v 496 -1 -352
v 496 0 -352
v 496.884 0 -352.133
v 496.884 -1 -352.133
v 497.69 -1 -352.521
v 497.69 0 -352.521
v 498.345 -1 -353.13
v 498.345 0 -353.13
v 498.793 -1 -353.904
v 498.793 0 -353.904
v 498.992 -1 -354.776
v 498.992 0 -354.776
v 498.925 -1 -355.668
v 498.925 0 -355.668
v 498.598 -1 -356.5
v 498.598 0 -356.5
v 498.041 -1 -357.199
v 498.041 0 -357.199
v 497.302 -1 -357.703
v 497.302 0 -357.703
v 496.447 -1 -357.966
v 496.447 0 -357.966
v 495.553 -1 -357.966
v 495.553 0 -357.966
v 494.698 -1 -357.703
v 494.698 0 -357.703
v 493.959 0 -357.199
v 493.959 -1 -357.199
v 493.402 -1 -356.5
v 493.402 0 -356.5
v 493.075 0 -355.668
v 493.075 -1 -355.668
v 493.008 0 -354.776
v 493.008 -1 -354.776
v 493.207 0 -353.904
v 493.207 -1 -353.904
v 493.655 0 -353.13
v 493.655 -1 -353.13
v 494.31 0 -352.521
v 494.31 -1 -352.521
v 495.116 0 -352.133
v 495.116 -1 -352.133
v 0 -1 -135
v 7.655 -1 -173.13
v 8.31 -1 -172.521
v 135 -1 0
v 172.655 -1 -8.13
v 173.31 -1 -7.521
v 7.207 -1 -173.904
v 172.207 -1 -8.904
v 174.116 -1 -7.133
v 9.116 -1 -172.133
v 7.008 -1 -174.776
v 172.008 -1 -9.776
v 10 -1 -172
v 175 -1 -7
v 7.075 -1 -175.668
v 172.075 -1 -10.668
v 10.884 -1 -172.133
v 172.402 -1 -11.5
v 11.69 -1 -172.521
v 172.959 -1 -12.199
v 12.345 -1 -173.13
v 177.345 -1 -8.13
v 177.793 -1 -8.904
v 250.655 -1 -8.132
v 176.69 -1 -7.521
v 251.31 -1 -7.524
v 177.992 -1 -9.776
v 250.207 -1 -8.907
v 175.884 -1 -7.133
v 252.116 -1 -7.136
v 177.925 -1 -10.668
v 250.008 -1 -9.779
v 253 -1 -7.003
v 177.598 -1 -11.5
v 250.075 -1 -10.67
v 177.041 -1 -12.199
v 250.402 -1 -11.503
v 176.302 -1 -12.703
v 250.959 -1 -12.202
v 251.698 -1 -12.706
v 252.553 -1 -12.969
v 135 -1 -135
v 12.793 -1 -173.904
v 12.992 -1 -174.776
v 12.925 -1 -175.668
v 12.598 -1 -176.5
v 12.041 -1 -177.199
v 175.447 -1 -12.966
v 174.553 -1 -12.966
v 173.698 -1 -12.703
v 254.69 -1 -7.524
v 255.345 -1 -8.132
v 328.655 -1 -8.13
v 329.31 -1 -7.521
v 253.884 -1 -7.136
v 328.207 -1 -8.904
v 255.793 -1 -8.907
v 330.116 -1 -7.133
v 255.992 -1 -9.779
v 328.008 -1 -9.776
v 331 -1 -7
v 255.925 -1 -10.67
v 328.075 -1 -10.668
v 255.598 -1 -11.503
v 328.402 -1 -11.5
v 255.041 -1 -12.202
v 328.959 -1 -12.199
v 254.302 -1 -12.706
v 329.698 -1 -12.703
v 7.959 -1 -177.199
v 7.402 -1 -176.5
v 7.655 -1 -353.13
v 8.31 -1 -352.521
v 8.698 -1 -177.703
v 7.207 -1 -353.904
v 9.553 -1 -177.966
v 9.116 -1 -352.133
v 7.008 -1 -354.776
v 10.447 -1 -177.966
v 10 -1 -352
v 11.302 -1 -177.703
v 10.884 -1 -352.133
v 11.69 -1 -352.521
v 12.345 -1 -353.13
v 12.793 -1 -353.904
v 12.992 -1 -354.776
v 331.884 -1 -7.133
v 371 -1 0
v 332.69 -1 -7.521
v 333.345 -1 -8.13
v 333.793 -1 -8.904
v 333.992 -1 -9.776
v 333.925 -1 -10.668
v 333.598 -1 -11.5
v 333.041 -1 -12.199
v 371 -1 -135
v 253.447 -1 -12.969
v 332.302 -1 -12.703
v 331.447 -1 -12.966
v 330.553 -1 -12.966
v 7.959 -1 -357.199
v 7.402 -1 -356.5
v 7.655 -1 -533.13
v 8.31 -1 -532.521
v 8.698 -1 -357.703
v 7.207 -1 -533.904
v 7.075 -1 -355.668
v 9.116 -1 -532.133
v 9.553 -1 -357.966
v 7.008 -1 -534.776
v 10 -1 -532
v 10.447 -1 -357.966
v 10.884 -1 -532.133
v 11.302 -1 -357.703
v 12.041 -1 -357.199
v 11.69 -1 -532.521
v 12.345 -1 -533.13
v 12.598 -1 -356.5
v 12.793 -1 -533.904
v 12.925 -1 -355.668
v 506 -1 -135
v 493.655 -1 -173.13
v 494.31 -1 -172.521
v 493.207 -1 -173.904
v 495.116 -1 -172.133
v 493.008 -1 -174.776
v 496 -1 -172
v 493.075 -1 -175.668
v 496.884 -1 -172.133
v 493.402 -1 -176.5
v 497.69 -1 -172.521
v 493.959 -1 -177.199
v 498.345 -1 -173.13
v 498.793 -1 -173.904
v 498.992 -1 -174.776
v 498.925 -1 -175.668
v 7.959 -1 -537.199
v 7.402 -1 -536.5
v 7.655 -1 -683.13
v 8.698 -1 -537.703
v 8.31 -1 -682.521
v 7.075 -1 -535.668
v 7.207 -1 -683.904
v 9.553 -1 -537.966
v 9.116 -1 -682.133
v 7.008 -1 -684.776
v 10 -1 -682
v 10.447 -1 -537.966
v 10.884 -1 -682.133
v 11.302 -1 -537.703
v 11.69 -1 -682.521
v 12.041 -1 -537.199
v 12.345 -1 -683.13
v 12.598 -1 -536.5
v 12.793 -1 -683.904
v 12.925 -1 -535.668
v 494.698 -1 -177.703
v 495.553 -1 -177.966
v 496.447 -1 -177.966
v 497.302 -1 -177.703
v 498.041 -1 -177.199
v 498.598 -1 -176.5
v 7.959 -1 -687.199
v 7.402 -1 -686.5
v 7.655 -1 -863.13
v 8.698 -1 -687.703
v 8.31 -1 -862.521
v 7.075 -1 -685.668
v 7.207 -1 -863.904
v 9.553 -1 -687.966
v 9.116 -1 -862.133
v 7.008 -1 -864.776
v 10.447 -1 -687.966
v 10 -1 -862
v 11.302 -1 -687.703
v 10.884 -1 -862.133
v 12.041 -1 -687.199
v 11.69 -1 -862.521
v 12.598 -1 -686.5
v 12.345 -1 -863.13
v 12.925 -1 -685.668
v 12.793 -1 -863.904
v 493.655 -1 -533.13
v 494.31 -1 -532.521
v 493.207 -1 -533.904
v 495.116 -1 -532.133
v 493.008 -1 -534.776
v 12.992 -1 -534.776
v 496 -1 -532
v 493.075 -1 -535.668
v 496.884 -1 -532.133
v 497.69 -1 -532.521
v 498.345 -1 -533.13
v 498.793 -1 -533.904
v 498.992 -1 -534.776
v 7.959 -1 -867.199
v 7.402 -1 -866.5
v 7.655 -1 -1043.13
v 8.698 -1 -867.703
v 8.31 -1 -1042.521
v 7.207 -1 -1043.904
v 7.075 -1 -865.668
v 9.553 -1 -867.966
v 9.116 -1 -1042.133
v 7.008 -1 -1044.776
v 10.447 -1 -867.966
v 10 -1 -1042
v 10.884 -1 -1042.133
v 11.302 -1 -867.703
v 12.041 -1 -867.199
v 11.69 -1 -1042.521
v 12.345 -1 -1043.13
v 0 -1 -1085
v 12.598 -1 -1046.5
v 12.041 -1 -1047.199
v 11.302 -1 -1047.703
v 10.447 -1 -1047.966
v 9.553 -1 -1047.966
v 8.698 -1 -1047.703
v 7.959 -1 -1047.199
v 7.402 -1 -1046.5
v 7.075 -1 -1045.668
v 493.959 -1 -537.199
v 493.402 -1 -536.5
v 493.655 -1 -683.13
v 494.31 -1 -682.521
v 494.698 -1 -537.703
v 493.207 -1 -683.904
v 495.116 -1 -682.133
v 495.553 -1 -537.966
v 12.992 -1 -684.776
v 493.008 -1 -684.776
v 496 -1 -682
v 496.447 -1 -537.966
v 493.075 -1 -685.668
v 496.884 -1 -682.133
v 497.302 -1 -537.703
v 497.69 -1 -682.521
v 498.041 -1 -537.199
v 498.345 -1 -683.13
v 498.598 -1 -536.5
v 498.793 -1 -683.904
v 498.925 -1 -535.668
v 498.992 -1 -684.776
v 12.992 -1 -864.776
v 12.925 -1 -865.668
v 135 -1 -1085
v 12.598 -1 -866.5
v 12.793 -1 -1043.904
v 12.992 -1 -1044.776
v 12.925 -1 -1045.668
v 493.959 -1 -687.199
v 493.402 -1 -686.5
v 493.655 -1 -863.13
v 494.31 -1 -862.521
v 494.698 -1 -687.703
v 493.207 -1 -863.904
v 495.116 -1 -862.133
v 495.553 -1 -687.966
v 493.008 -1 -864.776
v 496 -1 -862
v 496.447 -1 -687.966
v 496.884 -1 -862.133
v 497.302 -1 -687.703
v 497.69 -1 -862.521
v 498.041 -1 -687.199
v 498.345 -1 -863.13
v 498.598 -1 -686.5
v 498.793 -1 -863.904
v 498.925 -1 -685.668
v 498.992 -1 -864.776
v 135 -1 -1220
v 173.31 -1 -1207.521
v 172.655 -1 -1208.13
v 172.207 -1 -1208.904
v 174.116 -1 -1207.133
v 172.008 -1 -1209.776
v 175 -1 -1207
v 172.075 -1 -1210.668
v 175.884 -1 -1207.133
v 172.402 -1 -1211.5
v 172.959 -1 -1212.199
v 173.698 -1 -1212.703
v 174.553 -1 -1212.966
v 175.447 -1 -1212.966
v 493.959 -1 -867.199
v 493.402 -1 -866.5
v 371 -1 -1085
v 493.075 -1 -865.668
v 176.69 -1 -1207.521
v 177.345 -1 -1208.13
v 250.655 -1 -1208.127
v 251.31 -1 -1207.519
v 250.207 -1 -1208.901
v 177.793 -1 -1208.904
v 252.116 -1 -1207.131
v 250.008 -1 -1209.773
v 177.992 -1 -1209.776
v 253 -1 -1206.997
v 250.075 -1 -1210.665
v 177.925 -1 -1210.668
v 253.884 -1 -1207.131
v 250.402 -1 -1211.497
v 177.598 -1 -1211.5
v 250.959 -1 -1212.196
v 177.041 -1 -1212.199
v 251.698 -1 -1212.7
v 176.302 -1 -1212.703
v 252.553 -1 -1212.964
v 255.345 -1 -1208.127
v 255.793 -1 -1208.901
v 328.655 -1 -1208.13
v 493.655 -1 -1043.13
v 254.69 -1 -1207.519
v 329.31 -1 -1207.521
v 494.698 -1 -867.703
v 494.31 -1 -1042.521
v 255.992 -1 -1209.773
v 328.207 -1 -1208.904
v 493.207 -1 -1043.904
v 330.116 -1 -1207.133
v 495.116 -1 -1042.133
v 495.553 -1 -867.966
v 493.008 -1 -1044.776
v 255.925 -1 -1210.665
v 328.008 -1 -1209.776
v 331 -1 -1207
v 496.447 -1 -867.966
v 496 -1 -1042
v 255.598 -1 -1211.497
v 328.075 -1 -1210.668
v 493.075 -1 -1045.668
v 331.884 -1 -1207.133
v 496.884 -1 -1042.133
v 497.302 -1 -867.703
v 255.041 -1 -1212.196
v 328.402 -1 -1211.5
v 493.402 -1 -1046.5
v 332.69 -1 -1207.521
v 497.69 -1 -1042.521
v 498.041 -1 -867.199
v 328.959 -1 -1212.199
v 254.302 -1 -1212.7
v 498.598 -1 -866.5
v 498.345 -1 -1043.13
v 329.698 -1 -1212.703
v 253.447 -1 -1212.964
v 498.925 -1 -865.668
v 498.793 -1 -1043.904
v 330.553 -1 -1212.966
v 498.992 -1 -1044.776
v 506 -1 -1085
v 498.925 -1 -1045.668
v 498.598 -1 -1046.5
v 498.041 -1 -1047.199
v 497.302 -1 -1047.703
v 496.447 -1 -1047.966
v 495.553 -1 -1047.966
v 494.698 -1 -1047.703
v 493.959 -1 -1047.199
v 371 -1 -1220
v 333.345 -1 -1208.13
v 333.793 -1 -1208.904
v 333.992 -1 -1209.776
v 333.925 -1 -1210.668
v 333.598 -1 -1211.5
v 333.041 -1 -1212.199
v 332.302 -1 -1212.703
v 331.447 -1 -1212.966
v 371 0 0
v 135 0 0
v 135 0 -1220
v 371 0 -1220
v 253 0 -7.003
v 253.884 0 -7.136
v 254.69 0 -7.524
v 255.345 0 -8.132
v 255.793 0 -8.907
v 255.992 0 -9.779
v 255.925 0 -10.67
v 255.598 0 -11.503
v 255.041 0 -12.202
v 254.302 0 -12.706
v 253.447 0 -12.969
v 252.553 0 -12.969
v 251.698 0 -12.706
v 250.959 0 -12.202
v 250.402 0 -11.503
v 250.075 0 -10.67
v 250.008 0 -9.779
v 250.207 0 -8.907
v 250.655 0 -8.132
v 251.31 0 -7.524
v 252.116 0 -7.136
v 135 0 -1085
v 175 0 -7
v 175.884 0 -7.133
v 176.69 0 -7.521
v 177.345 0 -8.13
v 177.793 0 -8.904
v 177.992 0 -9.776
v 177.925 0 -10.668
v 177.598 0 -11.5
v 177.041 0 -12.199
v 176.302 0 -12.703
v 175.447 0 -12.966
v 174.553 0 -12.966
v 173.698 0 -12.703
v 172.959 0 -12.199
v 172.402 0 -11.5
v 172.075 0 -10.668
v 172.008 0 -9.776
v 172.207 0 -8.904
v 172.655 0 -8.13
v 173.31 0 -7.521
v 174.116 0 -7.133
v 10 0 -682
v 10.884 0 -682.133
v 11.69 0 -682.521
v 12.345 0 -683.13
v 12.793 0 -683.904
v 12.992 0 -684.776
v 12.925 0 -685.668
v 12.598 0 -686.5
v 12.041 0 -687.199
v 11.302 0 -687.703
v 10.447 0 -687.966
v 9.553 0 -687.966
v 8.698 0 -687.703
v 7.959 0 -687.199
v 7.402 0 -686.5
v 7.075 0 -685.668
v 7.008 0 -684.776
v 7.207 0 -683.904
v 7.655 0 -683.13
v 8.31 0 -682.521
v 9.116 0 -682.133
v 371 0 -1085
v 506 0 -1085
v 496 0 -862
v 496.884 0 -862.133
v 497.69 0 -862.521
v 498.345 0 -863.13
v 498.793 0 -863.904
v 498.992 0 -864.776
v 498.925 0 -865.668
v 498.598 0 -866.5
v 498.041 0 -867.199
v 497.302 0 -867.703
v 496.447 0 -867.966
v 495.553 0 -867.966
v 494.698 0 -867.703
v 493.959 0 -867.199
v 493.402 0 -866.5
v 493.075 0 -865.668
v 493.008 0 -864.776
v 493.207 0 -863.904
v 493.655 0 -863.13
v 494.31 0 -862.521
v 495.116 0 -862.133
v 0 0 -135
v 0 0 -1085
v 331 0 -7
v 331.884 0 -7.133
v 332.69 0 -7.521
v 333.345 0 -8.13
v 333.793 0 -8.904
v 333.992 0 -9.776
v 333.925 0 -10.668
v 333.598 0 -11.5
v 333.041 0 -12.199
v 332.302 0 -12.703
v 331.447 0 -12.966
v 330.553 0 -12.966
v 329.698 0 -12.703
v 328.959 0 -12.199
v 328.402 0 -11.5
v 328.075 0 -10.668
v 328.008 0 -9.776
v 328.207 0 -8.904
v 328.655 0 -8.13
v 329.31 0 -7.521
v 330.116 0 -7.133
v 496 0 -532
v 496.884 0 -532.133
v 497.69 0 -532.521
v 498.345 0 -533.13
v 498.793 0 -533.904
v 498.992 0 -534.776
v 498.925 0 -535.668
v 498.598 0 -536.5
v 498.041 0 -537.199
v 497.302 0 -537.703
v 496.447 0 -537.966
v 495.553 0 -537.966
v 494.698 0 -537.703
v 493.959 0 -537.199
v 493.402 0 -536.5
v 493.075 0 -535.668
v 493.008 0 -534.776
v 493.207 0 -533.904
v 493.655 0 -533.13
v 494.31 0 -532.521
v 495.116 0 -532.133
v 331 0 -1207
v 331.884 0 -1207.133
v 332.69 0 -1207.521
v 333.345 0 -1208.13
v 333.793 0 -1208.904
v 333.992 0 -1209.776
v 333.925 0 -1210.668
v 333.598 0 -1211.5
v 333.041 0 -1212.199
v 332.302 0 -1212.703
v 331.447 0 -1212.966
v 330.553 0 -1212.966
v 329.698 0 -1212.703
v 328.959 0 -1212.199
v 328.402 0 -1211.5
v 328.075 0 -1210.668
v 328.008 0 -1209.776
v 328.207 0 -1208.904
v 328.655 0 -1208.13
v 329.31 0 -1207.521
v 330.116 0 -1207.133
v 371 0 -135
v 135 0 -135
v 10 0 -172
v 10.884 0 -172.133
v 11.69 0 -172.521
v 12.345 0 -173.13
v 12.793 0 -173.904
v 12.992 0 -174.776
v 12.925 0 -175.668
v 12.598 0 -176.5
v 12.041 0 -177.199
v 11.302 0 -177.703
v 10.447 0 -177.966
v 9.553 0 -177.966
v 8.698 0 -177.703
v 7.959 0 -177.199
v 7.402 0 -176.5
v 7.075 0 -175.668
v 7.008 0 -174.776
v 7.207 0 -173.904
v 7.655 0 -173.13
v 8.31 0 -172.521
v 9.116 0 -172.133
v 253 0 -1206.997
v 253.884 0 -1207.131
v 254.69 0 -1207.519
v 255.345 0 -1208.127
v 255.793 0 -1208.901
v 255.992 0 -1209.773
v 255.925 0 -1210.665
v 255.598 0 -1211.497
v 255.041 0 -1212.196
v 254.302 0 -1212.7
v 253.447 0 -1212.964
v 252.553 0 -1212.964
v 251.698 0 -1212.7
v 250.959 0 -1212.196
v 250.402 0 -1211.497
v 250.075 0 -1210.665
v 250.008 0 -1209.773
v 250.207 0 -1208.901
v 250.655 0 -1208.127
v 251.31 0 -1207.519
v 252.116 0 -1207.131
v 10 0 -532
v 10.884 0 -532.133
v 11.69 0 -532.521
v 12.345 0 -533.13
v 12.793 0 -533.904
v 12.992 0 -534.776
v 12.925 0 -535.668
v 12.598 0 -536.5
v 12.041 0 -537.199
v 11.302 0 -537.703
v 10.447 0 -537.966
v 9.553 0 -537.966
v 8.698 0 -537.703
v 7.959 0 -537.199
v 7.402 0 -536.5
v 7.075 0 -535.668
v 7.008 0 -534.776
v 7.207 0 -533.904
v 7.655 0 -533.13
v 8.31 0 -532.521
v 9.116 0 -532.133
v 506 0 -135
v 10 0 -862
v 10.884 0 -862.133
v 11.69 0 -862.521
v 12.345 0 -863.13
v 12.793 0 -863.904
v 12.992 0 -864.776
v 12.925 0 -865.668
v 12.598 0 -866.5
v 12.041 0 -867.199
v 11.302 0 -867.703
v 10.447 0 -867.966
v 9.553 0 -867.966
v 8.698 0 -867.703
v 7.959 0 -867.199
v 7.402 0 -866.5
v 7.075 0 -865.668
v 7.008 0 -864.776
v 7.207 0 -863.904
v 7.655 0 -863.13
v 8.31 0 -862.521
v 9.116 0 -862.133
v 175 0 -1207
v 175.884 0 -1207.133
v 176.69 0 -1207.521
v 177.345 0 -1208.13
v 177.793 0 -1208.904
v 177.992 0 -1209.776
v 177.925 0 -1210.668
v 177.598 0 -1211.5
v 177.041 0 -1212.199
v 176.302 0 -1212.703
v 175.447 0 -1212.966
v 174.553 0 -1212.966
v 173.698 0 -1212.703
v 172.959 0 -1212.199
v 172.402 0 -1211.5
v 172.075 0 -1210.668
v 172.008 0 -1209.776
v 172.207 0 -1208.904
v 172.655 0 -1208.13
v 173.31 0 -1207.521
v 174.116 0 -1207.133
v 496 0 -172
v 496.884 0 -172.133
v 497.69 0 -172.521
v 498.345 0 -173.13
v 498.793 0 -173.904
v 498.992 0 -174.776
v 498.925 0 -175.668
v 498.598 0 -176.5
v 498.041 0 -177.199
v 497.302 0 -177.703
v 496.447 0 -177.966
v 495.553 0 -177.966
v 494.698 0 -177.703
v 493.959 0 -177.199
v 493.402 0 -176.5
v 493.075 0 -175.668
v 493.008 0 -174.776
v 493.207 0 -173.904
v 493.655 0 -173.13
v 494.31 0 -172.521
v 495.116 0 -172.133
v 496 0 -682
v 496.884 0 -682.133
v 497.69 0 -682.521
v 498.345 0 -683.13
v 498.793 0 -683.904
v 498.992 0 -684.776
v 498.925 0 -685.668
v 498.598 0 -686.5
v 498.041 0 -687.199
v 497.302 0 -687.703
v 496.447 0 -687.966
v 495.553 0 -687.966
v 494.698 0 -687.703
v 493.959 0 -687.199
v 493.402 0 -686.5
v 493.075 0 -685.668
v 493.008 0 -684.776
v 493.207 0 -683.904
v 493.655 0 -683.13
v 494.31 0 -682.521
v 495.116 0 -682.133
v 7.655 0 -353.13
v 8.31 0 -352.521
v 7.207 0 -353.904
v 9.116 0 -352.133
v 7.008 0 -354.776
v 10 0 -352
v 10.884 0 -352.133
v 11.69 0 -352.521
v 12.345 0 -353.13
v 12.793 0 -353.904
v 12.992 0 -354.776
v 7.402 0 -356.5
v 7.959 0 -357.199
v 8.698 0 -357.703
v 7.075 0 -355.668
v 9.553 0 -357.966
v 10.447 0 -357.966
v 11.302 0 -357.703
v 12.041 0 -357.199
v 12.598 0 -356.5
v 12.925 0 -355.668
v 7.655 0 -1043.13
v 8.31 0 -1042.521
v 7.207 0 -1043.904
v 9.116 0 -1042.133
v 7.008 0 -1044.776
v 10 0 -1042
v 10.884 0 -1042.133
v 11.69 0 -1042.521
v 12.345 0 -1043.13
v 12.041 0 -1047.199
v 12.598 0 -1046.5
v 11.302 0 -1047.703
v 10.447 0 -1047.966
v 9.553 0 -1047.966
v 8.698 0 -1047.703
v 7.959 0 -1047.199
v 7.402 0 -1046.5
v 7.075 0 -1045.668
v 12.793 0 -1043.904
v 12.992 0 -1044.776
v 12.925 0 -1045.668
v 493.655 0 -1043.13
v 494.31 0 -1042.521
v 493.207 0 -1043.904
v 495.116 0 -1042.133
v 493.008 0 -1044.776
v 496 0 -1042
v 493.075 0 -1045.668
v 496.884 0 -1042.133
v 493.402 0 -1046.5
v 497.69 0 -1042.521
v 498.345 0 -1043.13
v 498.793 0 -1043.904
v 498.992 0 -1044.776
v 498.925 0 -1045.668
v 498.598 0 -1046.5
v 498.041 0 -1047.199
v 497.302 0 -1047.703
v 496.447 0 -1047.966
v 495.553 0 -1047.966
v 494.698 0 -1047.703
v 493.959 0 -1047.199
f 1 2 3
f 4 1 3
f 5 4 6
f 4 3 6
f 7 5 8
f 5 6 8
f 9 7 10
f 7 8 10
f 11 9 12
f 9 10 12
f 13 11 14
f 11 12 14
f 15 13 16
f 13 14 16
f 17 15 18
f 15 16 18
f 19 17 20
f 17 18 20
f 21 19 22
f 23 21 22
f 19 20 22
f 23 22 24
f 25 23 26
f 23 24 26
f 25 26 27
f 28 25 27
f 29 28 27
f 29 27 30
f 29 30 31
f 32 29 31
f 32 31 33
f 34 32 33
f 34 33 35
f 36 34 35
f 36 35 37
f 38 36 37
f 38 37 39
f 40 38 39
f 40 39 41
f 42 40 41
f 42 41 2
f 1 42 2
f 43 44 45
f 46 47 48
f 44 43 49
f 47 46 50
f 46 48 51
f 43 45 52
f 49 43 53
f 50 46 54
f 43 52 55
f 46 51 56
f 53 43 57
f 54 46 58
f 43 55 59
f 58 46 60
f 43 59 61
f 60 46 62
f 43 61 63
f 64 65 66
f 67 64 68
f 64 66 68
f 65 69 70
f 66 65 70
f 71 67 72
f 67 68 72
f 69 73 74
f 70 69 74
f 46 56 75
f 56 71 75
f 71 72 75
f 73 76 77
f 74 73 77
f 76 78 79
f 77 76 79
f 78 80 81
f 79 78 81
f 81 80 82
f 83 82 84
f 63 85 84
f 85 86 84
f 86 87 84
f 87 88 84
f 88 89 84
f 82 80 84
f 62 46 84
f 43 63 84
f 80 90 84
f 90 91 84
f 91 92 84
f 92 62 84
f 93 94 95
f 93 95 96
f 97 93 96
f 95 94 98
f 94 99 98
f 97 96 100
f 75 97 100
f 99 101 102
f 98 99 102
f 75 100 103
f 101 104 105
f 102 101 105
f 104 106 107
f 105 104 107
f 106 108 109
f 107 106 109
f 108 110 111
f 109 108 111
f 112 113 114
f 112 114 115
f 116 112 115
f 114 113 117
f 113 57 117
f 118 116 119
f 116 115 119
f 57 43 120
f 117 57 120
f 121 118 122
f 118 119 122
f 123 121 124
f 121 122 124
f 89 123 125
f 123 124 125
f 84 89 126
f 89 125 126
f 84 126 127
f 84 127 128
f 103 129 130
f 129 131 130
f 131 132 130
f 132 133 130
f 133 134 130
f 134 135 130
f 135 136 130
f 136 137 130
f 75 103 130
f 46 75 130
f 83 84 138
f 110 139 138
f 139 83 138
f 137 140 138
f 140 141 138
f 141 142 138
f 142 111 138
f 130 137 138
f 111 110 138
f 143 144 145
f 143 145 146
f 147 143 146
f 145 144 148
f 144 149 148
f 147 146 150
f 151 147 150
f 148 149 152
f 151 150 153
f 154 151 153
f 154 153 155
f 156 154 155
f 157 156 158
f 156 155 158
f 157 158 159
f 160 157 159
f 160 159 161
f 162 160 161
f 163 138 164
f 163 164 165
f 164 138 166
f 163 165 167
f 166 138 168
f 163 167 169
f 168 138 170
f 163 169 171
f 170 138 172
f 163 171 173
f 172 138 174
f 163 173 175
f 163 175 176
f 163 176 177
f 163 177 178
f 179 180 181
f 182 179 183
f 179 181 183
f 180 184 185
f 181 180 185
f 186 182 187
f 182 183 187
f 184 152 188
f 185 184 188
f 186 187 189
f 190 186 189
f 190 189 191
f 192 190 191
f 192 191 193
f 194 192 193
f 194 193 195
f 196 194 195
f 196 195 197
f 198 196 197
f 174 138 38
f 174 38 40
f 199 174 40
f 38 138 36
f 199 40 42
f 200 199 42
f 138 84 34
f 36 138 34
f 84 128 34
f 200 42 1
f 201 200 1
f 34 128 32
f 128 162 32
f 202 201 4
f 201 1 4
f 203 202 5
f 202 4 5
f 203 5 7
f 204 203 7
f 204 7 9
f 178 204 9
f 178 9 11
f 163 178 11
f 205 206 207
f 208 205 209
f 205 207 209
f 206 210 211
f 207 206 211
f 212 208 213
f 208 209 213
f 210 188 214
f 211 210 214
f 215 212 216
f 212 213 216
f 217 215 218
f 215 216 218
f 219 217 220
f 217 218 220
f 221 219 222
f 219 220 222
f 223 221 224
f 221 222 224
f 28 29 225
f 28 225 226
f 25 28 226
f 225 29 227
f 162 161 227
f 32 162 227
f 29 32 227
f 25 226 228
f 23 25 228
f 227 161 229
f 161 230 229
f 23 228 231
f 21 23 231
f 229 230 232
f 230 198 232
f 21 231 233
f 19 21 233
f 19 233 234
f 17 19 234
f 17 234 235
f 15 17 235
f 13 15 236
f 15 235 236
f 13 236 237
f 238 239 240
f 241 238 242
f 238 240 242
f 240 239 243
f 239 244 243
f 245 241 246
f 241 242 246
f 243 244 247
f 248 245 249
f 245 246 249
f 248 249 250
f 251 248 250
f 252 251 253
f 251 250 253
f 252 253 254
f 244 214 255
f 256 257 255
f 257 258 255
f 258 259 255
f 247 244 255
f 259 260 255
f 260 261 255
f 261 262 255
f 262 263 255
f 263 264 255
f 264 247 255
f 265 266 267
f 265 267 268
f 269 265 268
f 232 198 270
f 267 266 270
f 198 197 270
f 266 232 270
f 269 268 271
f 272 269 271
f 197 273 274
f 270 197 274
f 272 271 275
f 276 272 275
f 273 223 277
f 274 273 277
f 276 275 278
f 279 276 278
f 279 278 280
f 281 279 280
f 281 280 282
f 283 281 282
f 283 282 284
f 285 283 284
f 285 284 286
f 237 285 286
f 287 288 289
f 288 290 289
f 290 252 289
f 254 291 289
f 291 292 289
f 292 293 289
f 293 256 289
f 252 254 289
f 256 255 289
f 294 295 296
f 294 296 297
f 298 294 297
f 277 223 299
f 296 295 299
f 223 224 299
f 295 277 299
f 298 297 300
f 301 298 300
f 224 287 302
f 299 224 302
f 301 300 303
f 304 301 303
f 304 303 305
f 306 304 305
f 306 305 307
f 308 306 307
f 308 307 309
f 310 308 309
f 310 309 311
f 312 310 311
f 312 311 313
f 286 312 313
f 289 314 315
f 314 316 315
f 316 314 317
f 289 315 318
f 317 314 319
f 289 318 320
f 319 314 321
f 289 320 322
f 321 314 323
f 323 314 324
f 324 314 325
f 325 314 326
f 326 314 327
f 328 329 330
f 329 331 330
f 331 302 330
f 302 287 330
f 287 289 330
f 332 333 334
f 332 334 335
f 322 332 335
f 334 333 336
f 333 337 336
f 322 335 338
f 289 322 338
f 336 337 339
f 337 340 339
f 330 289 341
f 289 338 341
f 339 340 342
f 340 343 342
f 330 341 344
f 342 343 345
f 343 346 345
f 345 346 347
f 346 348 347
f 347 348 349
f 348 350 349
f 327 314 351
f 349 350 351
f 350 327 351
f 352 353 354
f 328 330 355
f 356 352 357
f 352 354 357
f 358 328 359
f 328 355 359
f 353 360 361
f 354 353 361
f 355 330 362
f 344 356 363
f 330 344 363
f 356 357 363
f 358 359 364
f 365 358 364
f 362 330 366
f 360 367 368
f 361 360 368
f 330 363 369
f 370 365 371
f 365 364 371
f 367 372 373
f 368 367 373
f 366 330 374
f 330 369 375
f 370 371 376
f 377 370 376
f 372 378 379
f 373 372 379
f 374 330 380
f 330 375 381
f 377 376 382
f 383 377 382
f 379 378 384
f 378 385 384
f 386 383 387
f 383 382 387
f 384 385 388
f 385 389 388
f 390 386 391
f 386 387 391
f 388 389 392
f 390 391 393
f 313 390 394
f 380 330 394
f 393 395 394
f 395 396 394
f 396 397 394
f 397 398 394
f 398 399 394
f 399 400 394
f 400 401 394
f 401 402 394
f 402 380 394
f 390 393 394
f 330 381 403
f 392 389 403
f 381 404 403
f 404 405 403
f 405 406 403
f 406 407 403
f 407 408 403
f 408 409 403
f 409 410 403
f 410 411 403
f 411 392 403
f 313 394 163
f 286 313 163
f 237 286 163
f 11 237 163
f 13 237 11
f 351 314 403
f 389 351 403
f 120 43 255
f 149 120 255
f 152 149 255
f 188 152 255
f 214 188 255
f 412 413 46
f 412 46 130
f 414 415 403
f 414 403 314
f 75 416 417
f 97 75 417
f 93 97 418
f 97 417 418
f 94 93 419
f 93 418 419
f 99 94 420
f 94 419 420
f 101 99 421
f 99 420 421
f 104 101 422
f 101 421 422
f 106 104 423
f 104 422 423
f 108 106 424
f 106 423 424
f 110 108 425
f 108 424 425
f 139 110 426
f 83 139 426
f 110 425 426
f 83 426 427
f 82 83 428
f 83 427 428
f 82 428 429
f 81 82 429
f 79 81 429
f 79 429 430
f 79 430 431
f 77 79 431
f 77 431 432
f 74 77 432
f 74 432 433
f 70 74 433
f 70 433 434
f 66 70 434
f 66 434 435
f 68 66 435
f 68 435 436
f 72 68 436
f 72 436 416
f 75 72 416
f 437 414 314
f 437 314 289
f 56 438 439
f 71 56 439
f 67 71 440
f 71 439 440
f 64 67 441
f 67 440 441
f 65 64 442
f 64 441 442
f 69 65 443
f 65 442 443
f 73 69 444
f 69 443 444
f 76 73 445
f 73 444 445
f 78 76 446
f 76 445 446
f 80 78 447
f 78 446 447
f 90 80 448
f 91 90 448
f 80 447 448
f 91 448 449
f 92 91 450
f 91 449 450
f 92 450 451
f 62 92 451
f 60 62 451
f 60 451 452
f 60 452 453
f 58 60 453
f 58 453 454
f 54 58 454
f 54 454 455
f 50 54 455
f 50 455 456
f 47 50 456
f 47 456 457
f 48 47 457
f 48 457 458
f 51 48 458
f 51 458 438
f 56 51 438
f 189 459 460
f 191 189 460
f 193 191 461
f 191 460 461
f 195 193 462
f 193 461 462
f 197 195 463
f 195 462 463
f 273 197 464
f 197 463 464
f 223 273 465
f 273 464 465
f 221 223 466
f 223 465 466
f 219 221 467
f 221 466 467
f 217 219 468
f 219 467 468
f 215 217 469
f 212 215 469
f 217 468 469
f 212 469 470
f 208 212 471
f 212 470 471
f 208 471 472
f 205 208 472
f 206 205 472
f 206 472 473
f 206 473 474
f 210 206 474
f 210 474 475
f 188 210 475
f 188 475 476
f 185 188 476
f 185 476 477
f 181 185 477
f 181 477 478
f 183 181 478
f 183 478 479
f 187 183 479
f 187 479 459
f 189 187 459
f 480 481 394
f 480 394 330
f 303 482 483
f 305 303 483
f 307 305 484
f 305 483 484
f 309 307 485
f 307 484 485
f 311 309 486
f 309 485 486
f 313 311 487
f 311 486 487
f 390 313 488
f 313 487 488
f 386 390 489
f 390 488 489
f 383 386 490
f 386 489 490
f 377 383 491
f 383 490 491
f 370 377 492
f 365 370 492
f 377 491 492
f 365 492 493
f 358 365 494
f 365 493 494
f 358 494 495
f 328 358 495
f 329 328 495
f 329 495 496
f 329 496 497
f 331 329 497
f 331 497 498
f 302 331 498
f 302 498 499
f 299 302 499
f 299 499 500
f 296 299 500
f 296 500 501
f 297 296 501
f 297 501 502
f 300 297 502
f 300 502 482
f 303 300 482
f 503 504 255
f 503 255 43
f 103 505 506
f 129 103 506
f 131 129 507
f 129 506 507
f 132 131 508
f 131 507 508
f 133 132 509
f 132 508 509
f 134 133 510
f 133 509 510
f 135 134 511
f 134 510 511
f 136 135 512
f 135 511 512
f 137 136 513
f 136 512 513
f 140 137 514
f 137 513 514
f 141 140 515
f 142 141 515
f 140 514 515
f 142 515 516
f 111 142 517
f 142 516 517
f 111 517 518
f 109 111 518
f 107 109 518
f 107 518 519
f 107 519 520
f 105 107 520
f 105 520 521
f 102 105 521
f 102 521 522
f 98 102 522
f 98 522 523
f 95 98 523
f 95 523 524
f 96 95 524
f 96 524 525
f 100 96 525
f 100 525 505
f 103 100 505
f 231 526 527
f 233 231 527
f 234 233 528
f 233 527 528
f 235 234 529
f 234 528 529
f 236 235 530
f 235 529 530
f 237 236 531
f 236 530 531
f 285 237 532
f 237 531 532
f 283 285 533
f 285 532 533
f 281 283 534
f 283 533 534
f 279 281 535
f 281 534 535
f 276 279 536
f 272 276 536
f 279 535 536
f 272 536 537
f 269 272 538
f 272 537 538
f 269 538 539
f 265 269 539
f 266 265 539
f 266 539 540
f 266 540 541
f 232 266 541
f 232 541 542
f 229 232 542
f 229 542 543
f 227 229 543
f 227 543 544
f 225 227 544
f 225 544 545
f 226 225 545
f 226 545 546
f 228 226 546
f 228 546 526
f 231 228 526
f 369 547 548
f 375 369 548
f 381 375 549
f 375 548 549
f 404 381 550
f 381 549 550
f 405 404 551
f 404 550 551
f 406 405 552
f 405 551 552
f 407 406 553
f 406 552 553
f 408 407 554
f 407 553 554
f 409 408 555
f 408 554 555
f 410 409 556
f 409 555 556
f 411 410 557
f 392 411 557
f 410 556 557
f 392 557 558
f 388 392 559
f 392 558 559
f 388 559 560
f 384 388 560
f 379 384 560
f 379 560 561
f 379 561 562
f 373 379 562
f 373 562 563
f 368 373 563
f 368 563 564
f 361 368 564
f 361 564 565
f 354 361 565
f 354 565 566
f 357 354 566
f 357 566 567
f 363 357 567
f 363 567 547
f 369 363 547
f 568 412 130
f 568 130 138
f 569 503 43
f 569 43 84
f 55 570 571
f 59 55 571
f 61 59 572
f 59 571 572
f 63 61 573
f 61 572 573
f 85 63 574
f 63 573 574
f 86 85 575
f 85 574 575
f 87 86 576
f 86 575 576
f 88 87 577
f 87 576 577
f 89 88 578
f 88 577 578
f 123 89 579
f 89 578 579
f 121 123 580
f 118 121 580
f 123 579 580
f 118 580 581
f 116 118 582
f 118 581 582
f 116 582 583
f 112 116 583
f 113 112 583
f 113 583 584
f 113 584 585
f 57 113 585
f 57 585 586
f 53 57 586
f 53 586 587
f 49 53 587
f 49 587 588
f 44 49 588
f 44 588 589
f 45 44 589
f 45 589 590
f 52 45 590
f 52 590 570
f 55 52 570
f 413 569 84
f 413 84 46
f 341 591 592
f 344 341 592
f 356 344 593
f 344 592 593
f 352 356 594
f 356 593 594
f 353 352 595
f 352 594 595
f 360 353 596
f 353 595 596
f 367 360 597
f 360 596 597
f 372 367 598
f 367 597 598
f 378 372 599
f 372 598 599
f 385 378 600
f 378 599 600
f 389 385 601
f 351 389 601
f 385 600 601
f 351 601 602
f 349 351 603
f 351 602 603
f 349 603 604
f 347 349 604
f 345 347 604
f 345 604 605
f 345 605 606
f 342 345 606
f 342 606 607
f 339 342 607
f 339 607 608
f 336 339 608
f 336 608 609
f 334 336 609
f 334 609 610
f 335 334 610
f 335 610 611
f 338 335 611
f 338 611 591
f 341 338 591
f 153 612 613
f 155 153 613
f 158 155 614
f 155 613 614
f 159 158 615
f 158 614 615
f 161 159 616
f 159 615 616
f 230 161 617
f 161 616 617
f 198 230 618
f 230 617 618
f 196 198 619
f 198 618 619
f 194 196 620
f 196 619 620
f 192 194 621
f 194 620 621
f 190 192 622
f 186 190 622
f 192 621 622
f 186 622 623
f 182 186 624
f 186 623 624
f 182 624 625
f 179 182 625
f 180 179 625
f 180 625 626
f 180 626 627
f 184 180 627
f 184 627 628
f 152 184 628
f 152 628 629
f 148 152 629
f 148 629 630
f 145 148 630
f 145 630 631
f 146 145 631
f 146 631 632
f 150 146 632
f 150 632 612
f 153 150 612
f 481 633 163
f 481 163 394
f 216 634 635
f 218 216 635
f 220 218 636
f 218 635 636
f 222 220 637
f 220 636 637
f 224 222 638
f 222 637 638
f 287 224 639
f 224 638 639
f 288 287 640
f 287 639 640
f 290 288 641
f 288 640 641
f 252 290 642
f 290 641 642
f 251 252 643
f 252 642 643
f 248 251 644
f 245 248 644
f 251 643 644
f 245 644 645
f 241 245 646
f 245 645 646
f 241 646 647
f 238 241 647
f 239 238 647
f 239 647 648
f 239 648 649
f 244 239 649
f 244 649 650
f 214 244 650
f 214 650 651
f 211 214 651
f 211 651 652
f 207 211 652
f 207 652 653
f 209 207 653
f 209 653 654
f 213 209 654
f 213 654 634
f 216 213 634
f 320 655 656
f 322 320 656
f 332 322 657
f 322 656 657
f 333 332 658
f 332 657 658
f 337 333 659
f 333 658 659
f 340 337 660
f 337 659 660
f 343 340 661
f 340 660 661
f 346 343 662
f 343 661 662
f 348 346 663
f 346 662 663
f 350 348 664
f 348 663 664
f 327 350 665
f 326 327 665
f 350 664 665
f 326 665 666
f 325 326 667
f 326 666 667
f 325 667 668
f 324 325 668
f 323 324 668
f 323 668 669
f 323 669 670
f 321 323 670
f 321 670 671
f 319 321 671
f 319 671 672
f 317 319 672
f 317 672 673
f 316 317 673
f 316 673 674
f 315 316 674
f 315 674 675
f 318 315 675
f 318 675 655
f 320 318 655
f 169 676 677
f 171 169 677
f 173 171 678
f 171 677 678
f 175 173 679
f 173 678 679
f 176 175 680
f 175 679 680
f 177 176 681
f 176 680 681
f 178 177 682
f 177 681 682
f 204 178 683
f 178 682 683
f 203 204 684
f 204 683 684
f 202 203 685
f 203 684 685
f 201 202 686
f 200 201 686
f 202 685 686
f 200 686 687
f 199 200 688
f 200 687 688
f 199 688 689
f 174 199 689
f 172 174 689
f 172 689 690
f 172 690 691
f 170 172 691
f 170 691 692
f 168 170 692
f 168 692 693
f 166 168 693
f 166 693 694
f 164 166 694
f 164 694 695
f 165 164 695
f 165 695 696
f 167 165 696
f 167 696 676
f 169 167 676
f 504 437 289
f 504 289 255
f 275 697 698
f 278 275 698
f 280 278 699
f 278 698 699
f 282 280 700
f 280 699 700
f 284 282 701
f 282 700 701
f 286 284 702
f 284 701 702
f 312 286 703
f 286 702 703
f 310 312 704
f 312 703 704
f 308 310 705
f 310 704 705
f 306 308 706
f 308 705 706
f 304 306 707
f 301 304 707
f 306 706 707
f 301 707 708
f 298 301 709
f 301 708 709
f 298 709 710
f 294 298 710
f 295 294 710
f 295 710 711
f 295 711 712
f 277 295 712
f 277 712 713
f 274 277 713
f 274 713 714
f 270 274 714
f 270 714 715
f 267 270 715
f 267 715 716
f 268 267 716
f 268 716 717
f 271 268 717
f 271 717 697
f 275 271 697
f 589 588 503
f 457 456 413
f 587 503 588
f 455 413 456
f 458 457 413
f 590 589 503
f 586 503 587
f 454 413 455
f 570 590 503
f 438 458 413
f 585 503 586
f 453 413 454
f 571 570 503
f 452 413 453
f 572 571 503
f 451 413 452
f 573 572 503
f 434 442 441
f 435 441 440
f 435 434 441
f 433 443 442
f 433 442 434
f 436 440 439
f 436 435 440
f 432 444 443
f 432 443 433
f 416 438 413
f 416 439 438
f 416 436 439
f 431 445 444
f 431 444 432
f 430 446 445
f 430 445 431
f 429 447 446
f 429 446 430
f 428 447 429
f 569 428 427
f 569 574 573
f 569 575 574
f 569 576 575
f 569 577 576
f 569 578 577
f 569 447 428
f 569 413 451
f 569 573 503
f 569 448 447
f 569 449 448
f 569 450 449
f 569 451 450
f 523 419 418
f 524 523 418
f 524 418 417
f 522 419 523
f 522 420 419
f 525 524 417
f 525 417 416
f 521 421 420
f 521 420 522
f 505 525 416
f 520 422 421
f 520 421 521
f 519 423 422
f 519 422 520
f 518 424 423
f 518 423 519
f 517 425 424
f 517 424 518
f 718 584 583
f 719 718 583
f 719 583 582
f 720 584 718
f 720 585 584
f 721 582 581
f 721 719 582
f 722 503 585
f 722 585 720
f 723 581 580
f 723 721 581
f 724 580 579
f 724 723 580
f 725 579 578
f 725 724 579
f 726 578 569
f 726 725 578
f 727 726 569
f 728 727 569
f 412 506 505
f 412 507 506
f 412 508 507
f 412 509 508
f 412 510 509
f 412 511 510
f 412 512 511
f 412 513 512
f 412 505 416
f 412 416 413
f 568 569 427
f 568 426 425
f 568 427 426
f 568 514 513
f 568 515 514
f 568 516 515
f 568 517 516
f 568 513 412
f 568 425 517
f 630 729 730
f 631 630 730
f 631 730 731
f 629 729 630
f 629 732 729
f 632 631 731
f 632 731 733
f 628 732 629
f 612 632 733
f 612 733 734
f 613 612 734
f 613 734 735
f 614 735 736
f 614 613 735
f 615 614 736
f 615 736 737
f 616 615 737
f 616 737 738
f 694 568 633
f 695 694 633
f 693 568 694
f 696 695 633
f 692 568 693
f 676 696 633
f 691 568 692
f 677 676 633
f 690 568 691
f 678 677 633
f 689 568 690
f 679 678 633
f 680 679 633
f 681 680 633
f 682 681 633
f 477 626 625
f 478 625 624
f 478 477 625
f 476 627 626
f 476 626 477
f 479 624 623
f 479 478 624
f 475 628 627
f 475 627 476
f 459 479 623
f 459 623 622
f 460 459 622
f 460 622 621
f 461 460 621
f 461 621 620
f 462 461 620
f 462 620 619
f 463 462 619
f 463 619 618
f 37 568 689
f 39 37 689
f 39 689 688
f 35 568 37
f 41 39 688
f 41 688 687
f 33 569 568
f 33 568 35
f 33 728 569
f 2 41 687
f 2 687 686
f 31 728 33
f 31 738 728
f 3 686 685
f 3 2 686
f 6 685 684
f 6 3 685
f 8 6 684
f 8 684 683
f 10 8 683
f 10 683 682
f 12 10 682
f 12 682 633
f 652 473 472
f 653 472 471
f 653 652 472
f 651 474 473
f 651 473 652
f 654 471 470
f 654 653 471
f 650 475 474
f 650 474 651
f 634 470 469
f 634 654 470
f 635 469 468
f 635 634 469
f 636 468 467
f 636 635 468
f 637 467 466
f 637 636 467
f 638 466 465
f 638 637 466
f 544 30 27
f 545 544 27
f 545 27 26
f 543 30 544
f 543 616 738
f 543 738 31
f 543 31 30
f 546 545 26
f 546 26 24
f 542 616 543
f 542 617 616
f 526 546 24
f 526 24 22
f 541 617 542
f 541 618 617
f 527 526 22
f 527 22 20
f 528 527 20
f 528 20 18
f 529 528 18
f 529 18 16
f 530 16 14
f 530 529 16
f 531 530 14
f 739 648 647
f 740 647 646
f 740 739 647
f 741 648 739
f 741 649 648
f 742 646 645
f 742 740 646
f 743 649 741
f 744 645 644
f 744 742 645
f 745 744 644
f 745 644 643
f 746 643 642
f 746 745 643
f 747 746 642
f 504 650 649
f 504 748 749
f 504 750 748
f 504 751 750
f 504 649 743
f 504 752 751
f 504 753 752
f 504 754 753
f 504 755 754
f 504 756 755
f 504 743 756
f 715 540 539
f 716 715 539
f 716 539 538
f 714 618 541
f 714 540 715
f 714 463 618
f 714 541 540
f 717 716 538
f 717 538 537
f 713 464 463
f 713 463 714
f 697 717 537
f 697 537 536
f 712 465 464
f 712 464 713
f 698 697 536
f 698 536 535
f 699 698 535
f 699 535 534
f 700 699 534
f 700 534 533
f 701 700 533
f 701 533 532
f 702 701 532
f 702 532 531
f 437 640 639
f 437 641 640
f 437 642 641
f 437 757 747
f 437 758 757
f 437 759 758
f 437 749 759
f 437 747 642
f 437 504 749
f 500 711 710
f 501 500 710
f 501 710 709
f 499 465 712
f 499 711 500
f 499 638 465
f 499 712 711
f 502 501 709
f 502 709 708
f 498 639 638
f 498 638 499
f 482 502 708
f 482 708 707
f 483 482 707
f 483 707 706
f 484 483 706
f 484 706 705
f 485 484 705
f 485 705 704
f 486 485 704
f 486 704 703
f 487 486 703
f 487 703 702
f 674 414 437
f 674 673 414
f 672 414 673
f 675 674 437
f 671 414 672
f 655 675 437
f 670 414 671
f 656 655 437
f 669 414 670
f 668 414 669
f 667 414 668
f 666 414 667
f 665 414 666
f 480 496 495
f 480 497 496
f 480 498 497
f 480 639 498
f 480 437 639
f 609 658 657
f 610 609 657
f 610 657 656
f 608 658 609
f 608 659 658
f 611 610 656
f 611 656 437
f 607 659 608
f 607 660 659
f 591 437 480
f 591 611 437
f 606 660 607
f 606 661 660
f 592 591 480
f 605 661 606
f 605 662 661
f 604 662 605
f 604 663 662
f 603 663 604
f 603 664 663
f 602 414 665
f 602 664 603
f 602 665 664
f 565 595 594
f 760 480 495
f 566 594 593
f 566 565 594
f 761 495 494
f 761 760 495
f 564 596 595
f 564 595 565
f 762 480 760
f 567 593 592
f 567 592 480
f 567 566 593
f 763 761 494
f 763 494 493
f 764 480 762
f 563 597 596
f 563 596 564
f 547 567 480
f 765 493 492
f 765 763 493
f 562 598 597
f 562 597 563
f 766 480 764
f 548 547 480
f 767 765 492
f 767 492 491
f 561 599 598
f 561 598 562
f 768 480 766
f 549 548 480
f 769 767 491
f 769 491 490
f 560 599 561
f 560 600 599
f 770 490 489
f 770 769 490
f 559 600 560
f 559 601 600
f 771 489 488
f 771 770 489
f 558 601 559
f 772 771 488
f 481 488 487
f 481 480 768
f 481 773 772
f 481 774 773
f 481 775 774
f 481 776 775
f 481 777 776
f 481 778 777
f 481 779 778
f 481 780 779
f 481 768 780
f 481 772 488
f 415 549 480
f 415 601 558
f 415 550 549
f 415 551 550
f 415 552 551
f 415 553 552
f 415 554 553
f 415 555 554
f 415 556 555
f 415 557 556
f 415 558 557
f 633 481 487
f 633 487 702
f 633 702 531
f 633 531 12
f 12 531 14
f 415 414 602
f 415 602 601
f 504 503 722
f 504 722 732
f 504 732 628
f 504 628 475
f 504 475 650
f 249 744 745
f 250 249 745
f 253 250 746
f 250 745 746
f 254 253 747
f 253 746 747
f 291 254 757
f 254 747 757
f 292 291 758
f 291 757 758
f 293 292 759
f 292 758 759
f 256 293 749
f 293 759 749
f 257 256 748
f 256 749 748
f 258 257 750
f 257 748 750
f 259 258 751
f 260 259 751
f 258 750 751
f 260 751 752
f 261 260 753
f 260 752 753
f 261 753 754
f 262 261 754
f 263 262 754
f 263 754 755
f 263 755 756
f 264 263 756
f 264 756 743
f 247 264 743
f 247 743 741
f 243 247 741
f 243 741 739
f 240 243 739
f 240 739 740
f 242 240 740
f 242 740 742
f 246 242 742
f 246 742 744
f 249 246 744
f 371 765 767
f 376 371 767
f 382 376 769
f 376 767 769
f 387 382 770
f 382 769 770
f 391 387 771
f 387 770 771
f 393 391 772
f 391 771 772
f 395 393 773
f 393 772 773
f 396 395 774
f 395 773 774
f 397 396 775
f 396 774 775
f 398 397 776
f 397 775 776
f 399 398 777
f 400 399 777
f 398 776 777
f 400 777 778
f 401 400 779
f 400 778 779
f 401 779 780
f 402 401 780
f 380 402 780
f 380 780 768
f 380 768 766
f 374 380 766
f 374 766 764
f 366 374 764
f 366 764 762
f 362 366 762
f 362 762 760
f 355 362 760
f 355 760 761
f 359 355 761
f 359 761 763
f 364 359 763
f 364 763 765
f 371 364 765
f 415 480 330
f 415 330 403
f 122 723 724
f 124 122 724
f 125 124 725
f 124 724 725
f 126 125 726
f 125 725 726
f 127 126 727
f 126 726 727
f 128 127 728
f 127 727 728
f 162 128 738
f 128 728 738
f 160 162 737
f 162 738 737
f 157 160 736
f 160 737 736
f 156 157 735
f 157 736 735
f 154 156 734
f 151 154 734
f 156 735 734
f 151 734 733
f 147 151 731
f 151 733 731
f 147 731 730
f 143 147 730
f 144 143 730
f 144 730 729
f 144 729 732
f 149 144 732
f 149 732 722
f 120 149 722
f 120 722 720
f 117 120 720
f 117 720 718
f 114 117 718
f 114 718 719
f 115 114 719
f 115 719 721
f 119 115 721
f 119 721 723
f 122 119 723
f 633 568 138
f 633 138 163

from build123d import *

# Parameters (mm, degrees)
BASE_FLANGE1_DEPTH = 1
SKETCH6_R          = 3
CUT_EXTRUDE1_DEPTH = 10


# Sheet-metal steps are written as plain solids
with BuildPart() as part:
    # Sketch1 → Base-Flange1 (new body)
    with BuildSketch(Plane(origin=(0, 0, 0), x_dir=(1, 0, 0), z_dir=(0, 1, 0))):
        Polygon((135, 0), (371, 0), (371, 135), (506, 135), (506, 1085), (371, 1085), (371, 1220), (135, 1220), (135, 1085), (0, 1085), (0, 135), (135, 135), align=None)
    extrude(amount=-BASE_FLANGE1_DEPTH)

    # Sketch6 → Cut-Extrude1 (cut)
    with BuildSketch(Plane(origin=(0, 0, 0), x_dir=(1, 0, 0), z_dir=(0, 1, 0))):
        with Locations(Location((496, 1045, 0), (0, 0, 270))):
            Circle(SKETCH6_R)
        with Locations(Location((496, 865, 0), (0, 0, 270))):
            Circle(SKETCH6_R)
        with Locations(Location((496, 685, 0), (0, 0, 270))):
            Circle(SKETCH6_R)
        with Locations(Location((331, 1210, 0), (0, 0, 270))):
            Circle(SKETCH6_R)
        with Locations(Location((175, 1210, 0), (0, 0, 270))):
            Circle(SKETCH6_R)
        with Locations(Location((10, 685, 0), (0, 0, 270))):
            Circle(SKETCH6_R)
        with Locations(Location((10, 865, 0), (0, 0, 270))):
            Circle(SKETCH6_R)
        with Locations(Location((10, 1045, 0), (0, 0, 270))):
            Circle(SKETCH6_R)
        with Locations(Location((253, 1209.997298013, 0), (0, 0, 270))):
            Circle(SKETCH6_R)
        with Locations(Location((253, 10.002701987, 0), (0, 0, 270))):
            Circle(SKETCH6_R)
        with Locations(Location((10, 175, 0), (0, 0, 270))):
            Circle(SKETCH6_R)
        with Locations(Location((10, 355, 0), (0, 0, 270))):
            Circle(SKETCH6_R)
        with Locations(Location((10, 535, 0), (0, 0, 270))):
            Circle(SKETCH6_R)
        with Locations(Location((175, 10, 0), (0, 0, 270))):
            Circle(SKETCH6_R)
        with Locations(Location((331, 10, 0), (0, 0, 270))):
            Circle(SKETCH6_R)
        with Locations(Location((496, 535, 0), (0, 0, 270))):
            Circle(SKETCH6_R)
        with Locations(Location((496, 355, 0), (0, 0, 270))):
            Circle(SKETCH6_R)
        with Locations(Location((496, 175, 0), (0, 0, 270))):
            Circle(SKETCH6_R)
    extrude(amount=-CUT_EXTRUDE1_DEPTH, mode=Mode.SUBTRACT)


solid = part.part
